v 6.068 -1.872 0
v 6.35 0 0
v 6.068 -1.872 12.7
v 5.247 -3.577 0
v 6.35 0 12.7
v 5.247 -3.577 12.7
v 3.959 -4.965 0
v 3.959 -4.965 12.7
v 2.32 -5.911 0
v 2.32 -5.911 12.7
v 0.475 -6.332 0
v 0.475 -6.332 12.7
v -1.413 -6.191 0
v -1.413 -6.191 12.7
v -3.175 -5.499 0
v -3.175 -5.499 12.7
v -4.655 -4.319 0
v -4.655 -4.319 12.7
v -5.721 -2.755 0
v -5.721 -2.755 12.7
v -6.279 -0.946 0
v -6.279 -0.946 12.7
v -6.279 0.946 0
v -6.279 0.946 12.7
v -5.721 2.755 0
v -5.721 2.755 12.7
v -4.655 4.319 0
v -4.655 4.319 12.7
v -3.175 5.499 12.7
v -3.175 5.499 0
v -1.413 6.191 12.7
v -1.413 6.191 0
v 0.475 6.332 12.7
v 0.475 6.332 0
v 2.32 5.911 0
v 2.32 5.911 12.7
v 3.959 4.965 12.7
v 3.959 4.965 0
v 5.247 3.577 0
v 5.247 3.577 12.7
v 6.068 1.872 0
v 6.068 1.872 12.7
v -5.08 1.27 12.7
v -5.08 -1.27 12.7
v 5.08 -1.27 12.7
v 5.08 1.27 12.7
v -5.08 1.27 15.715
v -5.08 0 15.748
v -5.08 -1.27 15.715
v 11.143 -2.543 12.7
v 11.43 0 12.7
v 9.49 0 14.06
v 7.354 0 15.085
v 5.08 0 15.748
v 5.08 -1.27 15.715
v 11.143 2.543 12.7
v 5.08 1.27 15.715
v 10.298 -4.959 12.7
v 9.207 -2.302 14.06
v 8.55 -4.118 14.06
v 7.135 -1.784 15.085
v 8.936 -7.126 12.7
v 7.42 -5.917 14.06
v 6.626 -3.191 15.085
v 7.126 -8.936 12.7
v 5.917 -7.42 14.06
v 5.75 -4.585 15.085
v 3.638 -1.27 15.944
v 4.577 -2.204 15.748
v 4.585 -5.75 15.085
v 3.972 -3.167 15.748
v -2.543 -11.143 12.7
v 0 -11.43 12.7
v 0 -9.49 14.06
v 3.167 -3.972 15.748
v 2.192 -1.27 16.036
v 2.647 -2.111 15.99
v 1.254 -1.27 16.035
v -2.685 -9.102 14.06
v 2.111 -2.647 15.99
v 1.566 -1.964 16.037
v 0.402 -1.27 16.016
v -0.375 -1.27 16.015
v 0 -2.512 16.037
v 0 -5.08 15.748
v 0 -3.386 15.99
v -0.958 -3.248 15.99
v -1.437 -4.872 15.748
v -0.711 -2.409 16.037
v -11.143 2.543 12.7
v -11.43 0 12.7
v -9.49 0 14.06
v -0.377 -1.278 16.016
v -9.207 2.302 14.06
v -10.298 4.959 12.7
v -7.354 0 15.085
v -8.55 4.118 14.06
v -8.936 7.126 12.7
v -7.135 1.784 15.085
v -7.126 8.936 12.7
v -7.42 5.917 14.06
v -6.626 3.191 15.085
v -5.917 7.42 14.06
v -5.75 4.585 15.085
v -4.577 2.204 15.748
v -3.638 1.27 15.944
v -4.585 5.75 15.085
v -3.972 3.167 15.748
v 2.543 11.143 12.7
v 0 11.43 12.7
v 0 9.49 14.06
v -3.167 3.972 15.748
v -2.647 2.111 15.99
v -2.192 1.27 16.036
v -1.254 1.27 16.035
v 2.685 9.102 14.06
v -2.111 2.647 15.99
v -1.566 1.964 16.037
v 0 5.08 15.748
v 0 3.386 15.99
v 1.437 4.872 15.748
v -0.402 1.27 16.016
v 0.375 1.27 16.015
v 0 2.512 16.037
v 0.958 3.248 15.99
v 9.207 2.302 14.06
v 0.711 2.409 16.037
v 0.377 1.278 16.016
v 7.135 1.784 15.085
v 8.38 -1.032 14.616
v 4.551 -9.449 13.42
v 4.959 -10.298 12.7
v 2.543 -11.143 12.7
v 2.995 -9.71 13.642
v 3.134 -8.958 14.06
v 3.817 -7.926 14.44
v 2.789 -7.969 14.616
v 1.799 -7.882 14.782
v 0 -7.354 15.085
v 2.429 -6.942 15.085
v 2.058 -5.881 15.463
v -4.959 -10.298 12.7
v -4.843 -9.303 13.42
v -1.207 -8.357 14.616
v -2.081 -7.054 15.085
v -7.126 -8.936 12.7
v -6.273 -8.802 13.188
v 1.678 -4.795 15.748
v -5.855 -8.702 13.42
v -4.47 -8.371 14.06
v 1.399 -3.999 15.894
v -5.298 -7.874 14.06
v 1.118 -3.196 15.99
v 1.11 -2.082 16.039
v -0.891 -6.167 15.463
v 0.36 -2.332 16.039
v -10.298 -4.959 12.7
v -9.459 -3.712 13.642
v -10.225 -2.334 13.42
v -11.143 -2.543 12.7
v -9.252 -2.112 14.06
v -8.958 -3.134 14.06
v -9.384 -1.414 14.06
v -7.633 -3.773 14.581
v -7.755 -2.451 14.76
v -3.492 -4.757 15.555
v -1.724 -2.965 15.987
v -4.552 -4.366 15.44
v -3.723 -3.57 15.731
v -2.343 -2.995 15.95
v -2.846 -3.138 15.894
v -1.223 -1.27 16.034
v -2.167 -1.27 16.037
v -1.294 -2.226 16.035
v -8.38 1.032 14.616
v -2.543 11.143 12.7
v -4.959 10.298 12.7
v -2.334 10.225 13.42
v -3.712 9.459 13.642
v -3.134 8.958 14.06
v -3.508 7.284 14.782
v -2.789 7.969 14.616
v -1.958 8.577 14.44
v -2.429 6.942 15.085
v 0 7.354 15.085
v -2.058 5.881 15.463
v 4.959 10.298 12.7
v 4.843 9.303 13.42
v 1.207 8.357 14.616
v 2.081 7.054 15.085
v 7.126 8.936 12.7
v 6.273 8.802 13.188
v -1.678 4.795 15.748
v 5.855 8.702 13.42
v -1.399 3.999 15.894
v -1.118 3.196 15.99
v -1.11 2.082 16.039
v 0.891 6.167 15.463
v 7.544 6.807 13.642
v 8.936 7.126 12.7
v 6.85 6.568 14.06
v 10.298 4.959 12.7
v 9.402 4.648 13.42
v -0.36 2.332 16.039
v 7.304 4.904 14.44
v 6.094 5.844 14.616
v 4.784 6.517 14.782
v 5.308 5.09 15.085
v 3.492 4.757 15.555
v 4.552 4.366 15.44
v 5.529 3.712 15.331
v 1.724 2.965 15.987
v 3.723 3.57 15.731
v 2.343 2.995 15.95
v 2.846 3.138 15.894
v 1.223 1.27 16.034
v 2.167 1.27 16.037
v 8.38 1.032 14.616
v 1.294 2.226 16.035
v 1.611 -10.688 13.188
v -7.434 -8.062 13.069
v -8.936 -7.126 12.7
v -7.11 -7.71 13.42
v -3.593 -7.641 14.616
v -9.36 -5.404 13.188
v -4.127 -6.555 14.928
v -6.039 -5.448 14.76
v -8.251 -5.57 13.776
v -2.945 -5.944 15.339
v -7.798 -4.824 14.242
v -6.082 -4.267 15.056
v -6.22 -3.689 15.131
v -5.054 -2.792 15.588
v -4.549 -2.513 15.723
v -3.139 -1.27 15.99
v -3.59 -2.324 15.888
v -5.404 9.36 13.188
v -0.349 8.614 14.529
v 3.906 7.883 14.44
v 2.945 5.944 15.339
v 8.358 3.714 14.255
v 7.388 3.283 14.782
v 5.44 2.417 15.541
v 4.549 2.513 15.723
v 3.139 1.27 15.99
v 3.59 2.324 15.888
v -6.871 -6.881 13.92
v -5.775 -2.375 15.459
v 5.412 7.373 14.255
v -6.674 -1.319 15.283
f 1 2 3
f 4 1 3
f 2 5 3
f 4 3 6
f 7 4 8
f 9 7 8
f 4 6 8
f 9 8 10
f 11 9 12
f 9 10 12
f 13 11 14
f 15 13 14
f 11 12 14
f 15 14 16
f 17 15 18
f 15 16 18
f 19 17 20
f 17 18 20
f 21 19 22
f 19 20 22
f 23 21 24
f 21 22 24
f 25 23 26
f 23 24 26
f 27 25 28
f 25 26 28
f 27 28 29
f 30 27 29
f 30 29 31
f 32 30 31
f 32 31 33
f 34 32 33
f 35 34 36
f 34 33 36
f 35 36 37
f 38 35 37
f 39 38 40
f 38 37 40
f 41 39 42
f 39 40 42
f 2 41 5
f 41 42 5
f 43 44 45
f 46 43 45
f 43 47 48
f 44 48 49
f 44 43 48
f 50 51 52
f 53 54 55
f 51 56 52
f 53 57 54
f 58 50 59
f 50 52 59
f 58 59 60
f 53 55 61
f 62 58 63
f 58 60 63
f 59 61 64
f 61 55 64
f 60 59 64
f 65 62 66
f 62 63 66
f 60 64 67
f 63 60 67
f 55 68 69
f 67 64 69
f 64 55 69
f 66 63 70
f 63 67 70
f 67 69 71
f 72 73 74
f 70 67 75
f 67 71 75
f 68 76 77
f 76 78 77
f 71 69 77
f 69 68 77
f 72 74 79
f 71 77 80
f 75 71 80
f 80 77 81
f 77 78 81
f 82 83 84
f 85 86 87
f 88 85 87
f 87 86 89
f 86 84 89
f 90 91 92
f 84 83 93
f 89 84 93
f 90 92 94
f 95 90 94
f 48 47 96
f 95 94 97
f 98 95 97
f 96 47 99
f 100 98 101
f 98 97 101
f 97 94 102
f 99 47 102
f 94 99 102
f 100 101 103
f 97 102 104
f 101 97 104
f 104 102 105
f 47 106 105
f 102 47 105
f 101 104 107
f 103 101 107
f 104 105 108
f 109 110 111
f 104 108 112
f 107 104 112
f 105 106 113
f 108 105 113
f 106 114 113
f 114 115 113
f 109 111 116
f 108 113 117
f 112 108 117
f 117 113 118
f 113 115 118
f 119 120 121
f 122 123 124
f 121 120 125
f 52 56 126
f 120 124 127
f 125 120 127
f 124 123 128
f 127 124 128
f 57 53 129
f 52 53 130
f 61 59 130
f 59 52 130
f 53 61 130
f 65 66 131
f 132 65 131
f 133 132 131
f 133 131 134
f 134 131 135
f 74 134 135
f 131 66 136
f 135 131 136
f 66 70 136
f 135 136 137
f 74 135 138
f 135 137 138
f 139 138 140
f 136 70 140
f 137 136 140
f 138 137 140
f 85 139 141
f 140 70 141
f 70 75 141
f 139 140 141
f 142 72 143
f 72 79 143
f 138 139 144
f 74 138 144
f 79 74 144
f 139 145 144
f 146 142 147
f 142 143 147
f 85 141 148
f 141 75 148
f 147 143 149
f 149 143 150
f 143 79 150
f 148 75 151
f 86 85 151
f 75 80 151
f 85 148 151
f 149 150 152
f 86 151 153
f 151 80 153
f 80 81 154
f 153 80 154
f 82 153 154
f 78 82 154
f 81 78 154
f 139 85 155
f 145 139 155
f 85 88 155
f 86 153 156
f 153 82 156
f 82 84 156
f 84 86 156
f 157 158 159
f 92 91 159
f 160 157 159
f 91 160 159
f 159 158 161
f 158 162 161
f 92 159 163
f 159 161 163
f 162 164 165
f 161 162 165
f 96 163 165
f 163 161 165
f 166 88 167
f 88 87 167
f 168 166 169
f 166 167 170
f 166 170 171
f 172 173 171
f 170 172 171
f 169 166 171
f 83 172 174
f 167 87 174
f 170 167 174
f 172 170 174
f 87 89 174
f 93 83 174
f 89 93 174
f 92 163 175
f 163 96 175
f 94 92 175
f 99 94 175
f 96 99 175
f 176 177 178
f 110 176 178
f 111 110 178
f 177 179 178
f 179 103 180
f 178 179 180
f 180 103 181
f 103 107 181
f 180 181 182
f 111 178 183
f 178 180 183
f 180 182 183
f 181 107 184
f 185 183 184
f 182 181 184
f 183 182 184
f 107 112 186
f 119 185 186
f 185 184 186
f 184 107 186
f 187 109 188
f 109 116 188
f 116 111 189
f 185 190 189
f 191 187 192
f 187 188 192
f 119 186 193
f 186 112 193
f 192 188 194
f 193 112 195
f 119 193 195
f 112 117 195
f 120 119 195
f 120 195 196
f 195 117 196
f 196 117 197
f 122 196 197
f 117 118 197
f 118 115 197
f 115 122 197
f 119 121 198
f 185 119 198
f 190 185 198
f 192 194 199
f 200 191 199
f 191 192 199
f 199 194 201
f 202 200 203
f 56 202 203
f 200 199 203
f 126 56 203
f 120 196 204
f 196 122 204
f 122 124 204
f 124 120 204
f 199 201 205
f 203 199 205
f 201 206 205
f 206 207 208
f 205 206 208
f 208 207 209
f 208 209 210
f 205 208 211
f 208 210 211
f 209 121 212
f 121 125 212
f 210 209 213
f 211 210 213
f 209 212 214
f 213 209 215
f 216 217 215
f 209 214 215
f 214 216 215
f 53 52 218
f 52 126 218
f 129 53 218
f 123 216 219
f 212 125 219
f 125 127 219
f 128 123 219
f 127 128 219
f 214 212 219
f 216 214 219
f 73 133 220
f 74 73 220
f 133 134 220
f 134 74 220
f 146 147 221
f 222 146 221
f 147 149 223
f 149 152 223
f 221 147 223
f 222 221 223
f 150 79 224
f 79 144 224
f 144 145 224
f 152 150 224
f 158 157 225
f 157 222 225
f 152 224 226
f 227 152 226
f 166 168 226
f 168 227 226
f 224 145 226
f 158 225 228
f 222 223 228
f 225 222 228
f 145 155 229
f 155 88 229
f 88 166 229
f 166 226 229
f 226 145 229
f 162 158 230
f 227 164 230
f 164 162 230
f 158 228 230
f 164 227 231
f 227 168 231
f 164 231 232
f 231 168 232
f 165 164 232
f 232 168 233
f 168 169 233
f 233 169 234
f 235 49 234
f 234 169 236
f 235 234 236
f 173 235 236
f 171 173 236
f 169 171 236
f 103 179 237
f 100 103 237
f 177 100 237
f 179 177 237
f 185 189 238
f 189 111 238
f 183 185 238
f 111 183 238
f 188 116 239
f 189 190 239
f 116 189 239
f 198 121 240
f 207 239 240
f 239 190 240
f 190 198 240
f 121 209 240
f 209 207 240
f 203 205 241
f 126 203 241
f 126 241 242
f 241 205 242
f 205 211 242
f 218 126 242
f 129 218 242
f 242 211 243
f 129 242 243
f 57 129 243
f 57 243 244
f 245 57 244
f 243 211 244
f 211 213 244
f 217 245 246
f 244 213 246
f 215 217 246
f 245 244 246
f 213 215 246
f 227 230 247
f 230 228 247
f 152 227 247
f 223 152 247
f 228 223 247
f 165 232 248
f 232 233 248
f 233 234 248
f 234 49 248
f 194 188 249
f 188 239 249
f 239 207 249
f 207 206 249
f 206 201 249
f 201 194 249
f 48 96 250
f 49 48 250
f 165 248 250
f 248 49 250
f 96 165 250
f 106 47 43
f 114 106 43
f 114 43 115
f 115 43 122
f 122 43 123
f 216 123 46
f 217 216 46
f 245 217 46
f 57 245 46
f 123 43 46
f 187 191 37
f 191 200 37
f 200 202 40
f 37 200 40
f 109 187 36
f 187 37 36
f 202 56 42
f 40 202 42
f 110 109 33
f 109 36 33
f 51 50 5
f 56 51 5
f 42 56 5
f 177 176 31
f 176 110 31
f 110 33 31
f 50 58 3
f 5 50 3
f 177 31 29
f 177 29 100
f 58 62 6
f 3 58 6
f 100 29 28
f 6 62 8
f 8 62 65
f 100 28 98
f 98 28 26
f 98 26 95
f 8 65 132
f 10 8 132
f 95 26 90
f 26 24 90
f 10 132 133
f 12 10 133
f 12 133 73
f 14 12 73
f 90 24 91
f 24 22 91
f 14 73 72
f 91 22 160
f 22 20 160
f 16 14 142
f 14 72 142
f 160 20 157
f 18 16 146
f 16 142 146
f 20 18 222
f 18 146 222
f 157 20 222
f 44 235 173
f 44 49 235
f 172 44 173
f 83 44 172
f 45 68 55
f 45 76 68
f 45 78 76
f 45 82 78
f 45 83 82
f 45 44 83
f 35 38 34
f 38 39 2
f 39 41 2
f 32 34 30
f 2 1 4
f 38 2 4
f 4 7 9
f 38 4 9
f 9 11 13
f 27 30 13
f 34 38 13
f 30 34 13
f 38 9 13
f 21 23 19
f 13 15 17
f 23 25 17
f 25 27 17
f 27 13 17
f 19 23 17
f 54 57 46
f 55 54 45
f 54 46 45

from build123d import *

# Parameters (mm, degrees)
F2_W     = 10.16
F2_H     = 2.54
F3_DEPTH = 25.4


with BuildPart() as f1:
    # F0 (on Front) → F1 (revolve)
    with BuildSketch(Plane.XZ):
        with BuildLine():
            Line((0, 15.875), (0, 0))
            Line((0, 0), (6.35, 0))
            Line((6.35, 0), (6.35, 12.7))
            Line((6.35, 12.7), (11.43, 12.7))
            ThreePointArc((11.43, 12.7), (6.055334, 15.512702), (0, 15.875))
        make_face()
    revolve(axis=Axis((0, 0, 4.292885), (0, 0, -1)))

    # F2 (on face) → F3 (cut)
    with BuildSketch(Plane(origin=(0, 0, 12.7), x_dir=(1, 0, 0), z_dir=(0, 0, -1))):
        Rectangle(F2_W, F2_H)
    extrude(amount=-F3_DEPTH, mode=Mode.SUBTRACT)


solid = f1.part
